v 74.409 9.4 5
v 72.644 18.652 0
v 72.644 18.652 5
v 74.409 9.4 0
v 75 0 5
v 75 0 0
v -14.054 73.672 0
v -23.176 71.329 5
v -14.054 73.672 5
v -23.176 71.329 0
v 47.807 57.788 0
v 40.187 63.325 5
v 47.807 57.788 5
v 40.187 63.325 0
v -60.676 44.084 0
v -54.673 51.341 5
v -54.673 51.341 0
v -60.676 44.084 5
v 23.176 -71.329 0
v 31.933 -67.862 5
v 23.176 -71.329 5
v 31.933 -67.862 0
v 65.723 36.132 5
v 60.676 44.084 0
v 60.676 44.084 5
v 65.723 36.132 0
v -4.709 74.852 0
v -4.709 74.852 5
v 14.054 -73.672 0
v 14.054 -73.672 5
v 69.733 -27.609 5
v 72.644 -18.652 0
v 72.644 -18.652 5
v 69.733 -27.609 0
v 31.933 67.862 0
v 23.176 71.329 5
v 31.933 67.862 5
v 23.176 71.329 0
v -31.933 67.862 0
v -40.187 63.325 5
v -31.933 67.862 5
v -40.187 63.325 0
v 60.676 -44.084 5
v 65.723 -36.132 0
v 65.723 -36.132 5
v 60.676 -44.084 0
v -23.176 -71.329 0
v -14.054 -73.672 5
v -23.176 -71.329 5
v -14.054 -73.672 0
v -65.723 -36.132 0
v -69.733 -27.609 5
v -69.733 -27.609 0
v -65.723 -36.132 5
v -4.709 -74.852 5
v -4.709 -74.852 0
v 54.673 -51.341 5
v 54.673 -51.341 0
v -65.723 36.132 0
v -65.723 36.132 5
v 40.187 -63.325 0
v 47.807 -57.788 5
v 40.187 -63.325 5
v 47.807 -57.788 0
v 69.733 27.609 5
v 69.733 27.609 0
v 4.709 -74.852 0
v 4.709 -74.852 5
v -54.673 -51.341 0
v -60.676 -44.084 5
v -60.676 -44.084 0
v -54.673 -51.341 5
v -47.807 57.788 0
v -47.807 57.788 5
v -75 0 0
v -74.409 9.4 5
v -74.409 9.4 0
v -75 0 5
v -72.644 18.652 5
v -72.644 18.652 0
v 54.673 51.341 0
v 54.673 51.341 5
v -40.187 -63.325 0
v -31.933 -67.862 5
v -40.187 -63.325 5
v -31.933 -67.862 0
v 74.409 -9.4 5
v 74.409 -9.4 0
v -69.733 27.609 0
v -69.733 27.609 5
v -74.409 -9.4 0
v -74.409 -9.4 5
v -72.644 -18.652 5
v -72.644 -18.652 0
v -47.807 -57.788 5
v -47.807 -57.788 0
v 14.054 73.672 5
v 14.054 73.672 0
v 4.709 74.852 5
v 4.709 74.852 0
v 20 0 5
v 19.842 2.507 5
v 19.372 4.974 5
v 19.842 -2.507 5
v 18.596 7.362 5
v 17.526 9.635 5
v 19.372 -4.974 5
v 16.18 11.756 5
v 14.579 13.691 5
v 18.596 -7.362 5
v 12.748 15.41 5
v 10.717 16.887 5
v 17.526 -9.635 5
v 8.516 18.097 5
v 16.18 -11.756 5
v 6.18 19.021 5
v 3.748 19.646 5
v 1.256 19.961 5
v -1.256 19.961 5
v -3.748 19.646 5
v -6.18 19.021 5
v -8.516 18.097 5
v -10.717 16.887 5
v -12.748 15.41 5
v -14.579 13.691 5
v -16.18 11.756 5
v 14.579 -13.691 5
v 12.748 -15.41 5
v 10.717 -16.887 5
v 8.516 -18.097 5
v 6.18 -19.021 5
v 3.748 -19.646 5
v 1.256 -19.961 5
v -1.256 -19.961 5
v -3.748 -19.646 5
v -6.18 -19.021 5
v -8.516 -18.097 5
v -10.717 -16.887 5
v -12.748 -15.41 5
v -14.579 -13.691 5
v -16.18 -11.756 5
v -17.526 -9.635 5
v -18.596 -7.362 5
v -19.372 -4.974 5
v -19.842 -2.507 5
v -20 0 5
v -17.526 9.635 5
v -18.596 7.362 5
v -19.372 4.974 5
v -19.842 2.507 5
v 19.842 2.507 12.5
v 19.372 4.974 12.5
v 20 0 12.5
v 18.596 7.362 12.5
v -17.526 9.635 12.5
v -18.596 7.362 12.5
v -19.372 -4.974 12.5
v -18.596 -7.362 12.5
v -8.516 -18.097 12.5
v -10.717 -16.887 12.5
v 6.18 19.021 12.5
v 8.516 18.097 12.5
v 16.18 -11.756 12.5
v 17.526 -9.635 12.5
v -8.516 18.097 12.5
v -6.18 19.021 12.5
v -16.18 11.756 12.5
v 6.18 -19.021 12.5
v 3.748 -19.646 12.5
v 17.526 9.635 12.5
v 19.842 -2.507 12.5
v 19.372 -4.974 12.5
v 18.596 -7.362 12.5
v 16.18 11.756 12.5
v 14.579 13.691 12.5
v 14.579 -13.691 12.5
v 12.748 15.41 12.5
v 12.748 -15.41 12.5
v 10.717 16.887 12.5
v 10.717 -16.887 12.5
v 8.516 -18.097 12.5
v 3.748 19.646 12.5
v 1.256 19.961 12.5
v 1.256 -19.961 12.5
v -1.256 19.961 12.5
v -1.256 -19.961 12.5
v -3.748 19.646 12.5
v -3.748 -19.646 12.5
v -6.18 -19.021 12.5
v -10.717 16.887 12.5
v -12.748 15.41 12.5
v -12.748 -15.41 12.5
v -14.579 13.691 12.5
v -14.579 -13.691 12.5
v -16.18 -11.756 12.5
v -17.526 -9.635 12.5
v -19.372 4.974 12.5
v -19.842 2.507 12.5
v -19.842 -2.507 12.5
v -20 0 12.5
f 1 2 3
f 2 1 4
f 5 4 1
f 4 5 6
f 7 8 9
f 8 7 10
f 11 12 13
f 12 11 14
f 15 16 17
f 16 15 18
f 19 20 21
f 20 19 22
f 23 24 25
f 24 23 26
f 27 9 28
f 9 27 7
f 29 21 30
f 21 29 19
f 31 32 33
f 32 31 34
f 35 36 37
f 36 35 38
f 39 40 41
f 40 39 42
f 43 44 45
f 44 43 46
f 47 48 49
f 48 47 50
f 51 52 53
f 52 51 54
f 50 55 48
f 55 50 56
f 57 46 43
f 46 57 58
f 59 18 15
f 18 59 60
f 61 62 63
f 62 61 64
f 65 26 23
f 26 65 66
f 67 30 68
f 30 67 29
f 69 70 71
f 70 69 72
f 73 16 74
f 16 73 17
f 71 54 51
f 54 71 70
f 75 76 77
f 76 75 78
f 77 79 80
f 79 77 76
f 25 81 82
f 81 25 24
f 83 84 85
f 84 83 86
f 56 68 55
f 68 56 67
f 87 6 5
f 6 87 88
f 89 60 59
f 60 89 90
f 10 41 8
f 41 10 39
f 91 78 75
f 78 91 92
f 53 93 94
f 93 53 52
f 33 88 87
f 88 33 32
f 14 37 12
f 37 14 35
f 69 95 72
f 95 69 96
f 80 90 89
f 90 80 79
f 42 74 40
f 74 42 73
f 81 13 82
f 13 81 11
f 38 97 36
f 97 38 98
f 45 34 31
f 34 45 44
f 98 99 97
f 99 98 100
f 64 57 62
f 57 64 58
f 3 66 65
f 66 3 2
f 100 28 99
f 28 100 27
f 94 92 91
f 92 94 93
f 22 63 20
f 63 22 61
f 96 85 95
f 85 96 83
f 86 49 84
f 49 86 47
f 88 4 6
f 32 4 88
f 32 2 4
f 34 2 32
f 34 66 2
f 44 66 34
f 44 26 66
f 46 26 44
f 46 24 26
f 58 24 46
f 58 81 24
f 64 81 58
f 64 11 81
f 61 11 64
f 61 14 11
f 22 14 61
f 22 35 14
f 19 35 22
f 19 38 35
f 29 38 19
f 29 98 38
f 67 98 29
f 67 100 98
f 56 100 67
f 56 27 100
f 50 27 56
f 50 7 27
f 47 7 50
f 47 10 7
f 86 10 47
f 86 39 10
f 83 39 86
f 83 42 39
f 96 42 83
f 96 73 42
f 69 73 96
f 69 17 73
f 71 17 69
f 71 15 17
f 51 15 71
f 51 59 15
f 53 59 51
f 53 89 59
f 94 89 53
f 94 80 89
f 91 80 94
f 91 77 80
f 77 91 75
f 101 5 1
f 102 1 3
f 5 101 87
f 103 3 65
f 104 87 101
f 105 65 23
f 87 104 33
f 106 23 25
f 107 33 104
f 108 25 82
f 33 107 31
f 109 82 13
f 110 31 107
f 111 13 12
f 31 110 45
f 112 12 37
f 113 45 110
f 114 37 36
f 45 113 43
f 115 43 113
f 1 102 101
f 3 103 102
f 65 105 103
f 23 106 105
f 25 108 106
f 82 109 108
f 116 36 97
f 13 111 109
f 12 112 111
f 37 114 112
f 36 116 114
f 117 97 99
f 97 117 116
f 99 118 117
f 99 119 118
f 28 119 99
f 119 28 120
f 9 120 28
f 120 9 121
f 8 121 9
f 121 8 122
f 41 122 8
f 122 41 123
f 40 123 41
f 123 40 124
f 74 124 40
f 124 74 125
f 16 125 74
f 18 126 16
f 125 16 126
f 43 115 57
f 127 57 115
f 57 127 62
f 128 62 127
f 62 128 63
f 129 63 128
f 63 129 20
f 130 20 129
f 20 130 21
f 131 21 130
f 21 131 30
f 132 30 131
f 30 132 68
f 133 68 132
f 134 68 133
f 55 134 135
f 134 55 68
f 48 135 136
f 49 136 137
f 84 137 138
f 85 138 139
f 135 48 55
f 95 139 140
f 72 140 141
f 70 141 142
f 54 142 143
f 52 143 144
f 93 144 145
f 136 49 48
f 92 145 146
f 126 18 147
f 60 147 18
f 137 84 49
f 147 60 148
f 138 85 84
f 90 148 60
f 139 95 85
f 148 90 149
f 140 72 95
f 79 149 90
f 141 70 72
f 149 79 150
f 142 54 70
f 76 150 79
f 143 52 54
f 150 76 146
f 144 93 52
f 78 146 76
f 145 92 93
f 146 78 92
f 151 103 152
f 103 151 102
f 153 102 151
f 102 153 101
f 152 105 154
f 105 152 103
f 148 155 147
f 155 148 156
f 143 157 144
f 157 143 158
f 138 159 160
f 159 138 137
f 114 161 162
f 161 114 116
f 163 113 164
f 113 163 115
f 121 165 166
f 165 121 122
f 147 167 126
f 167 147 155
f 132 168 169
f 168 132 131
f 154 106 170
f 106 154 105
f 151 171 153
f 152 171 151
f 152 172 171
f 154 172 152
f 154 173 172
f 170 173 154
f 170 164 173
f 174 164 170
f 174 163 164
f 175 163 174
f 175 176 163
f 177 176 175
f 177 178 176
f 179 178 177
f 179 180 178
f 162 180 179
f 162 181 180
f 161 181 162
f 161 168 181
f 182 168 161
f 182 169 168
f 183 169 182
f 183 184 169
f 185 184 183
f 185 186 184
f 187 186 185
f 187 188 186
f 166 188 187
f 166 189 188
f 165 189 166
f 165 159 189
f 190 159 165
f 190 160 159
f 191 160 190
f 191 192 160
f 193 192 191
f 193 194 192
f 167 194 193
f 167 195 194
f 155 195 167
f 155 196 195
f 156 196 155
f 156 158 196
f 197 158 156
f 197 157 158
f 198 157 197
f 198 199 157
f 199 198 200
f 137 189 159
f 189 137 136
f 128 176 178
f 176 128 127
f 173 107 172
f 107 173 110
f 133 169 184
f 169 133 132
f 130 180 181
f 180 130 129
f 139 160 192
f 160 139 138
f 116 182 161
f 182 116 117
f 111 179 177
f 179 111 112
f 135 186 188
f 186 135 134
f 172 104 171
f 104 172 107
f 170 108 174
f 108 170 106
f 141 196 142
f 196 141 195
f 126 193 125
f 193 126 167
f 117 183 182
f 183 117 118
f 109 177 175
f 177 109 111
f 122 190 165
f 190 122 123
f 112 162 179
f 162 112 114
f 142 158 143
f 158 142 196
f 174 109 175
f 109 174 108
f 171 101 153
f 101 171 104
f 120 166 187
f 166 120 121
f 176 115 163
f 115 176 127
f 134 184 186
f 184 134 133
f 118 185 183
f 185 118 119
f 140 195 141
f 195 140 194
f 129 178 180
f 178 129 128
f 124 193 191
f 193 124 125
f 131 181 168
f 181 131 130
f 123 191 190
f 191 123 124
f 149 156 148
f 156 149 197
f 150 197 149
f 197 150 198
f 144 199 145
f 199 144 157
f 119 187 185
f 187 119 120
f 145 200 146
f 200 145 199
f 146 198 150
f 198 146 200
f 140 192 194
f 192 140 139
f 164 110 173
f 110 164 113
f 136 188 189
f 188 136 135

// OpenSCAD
diffuserRadius = 75;
washerHeight = 10;
washerRadius = 20;
innerRadius = 15;
sfn = 50;
topBottomThickness = 5;


holderHeight = 100;

translate([0,0, topBottomThickness/2]) { 
    cylinder(r = diffuserRadius, h = topBottomThickness, center=true, $fn = sfn);
    translate([0,0,washerHeight/2]) {
        cylinder(r = washerRadius, h = washerHeight, center = true, $fn = sfn);
    }
}
